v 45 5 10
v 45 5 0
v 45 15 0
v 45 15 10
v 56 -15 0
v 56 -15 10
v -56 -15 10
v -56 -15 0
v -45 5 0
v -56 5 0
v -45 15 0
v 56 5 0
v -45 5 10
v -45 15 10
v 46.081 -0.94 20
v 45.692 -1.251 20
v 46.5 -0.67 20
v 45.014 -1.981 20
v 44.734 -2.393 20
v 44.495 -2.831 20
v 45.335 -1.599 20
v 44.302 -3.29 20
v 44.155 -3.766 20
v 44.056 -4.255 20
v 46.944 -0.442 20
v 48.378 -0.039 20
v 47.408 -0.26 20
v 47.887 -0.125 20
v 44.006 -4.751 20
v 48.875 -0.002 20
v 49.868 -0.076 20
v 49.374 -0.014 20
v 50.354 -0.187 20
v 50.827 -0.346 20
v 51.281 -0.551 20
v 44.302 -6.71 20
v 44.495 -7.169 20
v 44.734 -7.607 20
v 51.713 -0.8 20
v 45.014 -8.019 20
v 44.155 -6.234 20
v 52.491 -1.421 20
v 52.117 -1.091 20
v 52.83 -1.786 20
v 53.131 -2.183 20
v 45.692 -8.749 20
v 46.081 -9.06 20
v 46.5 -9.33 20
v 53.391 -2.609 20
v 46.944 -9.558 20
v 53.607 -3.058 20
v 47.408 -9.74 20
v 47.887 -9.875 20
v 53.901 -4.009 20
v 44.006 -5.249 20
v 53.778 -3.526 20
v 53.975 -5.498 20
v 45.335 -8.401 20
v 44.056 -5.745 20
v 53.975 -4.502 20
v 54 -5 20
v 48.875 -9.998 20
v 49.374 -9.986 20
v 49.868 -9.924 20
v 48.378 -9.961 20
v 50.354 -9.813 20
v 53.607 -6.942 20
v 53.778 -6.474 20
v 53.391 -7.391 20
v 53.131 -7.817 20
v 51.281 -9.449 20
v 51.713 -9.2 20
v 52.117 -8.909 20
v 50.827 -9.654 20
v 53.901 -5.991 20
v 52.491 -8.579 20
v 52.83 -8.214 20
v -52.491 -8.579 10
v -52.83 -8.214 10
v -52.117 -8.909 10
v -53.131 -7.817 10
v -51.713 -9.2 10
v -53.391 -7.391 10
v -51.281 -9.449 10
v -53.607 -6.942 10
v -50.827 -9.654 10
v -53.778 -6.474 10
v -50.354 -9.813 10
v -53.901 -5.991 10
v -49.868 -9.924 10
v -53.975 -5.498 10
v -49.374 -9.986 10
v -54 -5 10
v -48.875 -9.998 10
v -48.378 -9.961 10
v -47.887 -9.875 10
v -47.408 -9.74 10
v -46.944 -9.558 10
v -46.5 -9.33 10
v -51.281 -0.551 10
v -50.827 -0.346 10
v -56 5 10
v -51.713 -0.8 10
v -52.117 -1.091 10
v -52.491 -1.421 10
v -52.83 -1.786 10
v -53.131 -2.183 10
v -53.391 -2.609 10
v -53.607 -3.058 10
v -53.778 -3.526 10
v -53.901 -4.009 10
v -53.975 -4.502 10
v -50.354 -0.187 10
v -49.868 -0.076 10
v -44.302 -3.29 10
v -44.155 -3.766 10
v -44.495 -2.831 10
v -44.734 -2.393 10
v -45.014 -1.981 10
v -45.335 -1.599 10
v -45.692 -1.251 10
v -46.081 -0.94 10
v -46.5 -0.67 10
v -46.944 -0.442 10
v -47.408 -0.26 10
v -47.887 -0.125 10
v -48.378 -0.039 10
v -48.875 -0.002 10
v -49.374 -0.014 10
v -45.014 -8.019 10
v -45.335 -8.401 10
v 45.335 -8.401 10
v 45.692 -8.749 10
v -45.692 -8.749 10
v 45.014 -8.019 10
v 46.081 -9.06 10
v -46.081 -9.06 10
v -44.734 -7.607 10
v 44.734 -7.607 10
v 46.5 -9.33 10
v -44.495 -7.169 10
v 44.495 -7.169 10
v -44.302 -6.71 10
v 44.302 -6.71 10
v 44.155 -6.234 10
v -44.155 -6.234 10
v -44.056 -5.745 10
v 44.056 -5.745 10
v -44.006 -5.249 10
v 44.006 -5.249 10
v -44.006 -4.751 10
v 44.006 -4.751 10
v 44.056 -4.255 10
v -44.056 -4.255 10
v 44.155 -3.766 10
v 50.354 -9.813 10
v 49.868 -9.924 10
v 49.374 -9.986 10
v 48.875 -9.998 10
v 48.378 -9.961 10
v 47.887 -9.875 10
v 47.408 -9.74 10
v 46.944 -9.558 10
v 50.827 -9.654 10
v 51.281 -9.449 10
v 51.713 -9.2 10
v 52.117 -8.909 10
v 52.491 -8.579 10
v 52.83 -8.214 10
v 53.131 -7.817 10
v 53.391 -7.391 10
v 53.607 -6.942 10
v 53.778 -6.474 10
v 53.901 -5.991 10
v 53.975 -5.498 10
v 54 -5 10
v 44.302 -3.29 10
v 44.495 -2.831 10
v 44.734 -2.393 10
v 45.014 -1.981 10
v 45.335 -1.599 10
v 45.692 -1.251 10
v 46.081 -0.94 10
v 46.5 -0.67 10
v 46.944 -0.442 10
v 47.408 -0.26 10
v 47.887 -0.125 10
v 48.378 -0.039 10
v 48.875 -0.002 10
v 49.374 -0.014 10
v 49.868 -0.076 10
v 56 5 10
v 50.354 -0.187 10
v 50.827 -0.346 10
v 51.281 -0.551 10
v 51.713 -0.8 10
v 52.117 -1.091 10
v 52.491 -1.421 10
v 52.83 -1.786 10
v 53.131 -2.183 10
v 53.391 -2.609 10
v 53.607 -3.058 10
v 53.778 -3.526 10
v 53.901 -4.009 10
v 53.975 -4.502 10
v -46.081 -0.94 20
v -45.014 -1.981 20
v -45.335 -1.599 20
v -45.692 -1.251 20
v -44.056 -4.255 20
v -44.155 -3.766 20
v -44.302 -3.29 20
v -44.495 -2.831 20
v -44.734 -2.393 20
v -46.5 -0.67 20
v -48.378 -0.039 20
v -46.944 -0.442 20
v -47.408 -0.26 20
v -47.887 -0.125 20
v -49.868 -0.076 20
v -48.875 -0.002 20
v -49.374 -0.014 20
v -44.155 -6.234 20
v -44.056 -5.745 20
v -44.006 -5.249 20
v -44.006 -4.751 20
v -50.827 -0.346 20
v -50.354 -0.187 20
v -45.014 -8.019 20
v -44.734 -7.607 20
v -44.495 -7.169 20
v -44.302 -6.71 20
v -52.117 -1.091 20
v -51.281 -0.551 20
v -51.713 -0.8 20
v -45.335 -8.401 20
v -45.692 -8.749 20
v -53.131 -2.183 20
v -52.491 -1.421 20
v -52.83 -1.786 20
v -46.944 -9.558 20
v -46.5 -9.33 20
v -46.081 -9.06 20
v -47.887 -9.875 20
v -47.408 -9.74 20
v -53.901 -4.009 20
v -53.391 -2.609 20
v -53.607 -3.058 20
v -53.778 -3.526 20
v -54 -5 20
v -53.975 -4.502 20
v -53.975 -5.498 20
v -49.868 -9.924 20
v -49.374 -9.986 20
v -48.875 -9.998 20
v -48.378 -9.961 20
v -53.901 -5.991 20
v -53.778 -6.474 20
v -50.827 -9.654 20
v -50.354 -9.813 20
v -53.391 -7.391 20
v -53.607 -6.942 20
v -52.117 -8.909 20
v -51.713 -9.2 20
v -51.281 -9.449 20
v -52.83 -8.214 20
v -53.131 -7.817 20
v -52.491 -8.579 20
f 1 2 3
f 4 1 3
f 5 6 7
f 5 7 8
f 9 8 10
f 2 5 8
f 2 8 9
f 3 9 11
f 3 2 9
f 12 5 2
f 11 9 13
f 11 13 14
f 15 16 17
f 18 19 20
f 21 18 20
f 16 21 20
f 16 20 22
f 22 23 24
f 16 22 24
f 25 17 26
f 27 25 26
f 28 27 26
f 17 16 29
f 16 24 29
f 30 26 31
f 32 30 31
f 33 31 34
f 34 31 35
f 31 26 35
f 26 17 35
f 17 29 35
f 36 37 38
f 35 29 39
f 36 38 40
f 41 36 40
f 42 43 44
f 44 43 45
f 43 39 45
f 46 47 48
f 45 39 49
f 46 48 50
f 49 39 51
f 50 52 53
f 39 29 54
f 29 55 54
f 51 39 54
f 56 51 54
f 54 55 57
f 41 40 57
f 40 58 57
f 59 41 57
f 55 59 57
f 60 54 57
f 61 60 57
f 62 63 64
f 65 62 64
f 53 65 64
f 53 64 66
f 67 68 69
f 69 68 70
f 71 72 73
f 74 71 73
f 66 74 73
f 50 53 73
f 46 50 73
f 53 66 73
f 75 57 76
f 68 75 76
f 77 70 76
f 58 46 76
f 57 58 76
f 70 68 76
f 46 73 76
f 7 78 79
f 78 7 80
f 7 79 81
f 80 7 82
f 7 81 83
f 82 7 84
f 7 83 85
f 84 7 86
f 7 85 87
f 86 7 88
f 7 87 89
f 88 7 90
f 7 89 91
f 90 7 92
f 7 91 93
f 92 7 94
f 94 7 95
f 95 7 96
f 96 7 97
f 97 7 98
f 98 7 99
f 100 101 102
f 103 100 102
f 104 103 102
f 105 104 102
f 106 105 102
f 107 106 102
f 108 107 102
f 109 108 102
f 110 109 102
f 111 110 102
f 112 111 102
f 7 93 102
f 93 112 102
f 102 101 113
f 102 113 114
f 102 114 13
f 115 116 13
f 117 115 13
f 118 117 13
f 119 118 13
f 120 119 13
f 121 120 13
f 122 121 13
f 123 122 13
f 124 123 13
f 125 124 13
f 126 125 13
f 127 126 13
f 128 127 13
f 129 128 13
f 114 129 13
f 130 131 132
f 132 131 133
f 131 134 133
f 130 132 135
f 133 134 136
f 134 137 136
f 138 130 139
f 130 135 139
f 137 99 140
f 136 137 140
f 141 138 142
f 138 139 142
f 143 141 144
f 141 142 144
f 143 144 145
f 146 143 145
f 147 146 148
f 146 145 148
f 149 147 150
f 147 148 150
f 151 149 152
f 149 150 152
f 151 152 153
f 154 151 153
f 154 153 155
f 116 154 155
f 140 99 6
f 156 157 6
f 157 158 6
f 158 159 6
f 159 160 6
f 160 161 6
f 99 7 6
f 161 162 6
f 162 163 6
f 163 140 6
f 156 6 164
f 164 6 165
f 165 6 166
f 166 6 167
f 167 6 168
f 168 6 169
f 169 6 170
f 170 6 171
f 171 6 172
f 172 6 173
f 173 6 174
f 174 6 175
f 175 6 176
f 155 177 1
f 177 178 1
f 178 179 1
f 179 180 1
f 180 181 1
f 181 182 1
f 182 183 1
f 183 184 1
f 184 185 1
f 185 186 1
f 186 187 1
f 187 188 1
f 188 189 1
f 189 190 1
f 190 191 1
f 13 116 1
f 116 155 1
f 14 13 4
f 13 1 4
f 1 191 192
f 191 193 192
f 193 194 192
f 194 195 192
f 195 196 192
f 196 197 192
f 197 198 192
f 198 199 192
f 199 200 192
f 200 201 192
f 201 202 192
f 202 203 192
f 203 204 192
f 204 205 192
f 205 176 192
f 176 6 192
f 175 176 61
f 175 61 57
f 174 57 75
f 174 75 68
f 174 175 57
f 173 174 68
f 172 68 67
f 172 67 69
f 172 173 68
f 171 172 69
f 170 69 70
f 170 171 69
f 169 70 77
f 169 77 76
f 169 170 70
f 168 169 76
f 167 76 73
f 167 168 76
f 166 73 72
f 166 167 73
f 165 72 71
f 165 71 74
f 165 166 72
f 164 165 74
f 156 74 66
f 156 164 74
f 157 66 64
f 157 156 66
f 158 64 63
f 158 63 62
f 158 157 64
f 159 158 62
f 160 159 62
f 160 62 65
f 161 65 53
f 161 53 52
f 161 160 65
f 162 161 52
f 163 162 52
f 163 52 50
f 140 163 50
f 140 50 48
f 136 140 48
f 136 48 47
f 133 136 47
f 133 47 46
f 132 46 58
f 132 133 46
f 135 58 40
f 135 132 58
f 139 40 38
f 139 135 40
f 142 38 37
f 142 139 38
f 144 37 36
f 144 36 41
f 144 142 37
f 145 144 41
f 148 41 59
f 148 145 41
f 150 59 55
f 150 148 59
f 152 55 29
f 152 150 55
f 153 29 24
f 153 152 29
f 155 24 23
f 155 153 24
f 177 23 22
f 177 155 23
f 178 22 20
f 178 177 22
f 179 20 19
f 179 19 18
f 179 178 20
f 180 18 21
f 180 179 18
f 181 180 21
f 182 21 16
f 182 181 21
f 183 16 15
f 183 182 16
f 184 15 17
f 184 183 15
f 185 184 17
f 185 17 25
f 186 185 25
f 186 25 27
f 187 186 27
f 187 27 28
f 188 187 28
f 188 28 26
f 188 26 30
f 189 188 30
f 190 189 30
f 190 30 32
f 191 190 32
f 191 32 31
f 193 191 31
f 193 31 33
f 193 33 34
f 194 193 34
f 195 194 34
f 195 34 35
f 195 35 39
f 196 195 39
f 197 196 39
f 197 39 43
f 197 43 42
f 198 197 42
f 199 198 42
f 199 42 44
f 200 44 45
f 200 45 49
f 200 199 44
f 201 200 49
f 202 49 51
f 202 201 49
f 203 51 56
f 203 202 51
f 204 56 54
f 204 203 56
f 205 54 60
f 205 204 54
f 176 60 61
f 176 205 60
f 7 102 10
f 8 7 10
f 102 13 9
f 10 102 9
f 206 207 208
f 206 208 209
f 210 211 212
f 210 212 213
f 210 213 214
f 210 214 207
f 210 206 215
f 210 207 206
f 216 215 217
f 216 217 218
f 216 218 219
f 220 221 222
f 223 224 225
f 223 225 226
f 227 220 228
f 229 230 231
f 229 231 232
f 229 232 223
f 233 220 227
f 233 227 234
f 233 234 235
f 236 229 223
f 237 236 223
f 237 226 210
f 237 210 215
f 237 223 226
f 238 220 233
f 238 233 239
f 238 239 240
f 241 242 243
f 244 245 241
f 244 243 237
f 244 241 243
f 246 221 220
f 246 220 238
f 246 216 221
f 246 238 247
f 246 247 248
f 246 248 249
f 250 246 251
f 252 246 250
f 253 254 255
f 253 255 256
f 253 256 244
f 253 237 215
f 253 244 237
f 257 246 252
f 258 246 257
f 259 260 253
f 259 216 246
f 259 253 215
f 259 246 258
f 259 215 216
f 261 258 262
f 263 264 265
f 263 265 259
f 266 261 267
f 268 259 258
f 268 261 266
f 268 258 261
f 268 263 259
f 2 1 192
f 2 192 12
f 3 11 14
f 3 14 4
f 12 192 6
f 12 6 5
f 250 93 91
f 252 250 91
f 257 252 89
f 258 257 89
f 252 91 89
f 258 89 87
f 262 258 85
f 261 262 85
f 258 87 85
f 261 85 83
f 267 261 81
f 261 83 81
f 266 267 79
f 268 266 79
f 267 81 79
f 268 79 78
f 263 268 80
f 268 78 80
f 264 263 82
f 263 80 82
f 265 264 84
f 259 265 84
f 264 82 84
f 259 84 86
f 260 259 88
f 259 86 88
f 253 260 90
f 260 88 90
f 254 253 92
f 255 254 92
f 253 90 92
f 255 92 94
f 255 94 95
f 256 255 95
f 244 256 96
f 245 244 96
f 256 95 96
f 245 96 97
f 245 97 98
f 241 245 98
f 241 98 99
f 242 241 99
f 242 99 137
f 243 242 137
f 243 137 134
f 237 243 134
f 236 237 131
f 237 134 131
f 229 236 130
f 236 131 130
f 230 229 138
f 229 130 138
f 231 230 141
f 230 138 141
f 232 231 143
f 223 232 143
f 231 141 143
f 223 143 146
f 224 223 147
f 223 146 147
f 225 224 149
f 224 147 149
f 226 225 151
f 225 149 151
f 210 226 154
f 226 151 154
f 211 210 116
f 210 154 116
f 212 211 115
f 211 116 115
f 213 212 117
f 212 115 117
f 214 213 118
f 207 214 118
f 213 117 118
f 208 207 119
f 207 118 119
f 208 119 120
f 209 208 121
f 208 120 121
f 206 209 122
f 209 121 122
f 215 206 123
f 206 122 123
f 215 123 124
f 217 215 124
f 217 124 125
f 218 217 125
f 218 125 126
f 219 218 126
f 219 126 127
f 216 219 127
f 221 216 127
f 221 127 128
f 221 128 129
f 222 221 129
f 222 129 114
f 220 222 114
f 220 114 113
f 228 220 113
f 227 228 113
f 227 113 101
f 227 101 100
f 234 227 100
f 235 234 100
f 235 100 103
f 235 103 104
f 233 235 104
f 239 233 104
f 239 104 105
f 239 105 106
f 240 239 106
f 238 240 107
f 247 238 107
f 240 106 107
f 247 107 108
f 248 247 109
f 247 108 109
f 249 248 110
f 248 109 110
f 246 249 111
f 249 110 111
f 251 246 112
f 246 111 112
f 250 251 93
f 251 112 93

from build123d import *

# Parameters (mm, degrees)
SKETCH1_W           = 90
SKETCH1_H           = 30
BOSS_EXTRUDE1_DEPTH = 10
SKETCH3_W           = 10
SKETCH3_H           = 20
BOSS_EXTRUDE2_DEPTH = 11
SKETCH4_R           = 5
BOSS_EXTRUDE3_DEPTH = 10


with BuildPart() as part:
    # Sketch1 → Boss-Extrude1 (new body)
    with BuildSketch(Plane.XY):
        Rectangle(SKETCH1_W, SKETCH1_H)
    extrude(amount=BOSS_EXTRUDE1_DEPTH)

    # Sketch3 → Boss-Extrude2 (add)
    with BuildSketch(Plane(origin=(45, 0, 0), x_dir=(0, 0, -1), z_dir=(1, 0, 0))):
        with Locations((-5, -5)):
            Rectangle(SKETCH3_W, SKETCH3_H)
    boss_extrude2 = extrude(amount=BOSS_EXTRUDE2_DEPTH)

    # Mirror1: Boss-Extrude2 across plane
    add(boss_extrude2.mirror(Plane(origin=(0, 0, 0), x_dir=(0, 0, 1), z_dir=(1, 0, 0))))

    # Sketch4 → Boss-Extrude3 (add)
    with BuildSketch(Plane.XY.offset(10)):
        with Locations(Location((-49, -5, 0), (0, 0, 180))):
            Circle(SKETCH4_R)
    boss_extrude3 = extrude(amount=BOSS_EXTRUDE3_DEPTH)

    # Mirror2: Boss-Extrude3 across plane
    add(boss_extrude3.mirror(Plane(origin=(0, 0, 0), x_dir=(0, 0, 1), z_dir=(1, 0, 0))))


solid = part.part
